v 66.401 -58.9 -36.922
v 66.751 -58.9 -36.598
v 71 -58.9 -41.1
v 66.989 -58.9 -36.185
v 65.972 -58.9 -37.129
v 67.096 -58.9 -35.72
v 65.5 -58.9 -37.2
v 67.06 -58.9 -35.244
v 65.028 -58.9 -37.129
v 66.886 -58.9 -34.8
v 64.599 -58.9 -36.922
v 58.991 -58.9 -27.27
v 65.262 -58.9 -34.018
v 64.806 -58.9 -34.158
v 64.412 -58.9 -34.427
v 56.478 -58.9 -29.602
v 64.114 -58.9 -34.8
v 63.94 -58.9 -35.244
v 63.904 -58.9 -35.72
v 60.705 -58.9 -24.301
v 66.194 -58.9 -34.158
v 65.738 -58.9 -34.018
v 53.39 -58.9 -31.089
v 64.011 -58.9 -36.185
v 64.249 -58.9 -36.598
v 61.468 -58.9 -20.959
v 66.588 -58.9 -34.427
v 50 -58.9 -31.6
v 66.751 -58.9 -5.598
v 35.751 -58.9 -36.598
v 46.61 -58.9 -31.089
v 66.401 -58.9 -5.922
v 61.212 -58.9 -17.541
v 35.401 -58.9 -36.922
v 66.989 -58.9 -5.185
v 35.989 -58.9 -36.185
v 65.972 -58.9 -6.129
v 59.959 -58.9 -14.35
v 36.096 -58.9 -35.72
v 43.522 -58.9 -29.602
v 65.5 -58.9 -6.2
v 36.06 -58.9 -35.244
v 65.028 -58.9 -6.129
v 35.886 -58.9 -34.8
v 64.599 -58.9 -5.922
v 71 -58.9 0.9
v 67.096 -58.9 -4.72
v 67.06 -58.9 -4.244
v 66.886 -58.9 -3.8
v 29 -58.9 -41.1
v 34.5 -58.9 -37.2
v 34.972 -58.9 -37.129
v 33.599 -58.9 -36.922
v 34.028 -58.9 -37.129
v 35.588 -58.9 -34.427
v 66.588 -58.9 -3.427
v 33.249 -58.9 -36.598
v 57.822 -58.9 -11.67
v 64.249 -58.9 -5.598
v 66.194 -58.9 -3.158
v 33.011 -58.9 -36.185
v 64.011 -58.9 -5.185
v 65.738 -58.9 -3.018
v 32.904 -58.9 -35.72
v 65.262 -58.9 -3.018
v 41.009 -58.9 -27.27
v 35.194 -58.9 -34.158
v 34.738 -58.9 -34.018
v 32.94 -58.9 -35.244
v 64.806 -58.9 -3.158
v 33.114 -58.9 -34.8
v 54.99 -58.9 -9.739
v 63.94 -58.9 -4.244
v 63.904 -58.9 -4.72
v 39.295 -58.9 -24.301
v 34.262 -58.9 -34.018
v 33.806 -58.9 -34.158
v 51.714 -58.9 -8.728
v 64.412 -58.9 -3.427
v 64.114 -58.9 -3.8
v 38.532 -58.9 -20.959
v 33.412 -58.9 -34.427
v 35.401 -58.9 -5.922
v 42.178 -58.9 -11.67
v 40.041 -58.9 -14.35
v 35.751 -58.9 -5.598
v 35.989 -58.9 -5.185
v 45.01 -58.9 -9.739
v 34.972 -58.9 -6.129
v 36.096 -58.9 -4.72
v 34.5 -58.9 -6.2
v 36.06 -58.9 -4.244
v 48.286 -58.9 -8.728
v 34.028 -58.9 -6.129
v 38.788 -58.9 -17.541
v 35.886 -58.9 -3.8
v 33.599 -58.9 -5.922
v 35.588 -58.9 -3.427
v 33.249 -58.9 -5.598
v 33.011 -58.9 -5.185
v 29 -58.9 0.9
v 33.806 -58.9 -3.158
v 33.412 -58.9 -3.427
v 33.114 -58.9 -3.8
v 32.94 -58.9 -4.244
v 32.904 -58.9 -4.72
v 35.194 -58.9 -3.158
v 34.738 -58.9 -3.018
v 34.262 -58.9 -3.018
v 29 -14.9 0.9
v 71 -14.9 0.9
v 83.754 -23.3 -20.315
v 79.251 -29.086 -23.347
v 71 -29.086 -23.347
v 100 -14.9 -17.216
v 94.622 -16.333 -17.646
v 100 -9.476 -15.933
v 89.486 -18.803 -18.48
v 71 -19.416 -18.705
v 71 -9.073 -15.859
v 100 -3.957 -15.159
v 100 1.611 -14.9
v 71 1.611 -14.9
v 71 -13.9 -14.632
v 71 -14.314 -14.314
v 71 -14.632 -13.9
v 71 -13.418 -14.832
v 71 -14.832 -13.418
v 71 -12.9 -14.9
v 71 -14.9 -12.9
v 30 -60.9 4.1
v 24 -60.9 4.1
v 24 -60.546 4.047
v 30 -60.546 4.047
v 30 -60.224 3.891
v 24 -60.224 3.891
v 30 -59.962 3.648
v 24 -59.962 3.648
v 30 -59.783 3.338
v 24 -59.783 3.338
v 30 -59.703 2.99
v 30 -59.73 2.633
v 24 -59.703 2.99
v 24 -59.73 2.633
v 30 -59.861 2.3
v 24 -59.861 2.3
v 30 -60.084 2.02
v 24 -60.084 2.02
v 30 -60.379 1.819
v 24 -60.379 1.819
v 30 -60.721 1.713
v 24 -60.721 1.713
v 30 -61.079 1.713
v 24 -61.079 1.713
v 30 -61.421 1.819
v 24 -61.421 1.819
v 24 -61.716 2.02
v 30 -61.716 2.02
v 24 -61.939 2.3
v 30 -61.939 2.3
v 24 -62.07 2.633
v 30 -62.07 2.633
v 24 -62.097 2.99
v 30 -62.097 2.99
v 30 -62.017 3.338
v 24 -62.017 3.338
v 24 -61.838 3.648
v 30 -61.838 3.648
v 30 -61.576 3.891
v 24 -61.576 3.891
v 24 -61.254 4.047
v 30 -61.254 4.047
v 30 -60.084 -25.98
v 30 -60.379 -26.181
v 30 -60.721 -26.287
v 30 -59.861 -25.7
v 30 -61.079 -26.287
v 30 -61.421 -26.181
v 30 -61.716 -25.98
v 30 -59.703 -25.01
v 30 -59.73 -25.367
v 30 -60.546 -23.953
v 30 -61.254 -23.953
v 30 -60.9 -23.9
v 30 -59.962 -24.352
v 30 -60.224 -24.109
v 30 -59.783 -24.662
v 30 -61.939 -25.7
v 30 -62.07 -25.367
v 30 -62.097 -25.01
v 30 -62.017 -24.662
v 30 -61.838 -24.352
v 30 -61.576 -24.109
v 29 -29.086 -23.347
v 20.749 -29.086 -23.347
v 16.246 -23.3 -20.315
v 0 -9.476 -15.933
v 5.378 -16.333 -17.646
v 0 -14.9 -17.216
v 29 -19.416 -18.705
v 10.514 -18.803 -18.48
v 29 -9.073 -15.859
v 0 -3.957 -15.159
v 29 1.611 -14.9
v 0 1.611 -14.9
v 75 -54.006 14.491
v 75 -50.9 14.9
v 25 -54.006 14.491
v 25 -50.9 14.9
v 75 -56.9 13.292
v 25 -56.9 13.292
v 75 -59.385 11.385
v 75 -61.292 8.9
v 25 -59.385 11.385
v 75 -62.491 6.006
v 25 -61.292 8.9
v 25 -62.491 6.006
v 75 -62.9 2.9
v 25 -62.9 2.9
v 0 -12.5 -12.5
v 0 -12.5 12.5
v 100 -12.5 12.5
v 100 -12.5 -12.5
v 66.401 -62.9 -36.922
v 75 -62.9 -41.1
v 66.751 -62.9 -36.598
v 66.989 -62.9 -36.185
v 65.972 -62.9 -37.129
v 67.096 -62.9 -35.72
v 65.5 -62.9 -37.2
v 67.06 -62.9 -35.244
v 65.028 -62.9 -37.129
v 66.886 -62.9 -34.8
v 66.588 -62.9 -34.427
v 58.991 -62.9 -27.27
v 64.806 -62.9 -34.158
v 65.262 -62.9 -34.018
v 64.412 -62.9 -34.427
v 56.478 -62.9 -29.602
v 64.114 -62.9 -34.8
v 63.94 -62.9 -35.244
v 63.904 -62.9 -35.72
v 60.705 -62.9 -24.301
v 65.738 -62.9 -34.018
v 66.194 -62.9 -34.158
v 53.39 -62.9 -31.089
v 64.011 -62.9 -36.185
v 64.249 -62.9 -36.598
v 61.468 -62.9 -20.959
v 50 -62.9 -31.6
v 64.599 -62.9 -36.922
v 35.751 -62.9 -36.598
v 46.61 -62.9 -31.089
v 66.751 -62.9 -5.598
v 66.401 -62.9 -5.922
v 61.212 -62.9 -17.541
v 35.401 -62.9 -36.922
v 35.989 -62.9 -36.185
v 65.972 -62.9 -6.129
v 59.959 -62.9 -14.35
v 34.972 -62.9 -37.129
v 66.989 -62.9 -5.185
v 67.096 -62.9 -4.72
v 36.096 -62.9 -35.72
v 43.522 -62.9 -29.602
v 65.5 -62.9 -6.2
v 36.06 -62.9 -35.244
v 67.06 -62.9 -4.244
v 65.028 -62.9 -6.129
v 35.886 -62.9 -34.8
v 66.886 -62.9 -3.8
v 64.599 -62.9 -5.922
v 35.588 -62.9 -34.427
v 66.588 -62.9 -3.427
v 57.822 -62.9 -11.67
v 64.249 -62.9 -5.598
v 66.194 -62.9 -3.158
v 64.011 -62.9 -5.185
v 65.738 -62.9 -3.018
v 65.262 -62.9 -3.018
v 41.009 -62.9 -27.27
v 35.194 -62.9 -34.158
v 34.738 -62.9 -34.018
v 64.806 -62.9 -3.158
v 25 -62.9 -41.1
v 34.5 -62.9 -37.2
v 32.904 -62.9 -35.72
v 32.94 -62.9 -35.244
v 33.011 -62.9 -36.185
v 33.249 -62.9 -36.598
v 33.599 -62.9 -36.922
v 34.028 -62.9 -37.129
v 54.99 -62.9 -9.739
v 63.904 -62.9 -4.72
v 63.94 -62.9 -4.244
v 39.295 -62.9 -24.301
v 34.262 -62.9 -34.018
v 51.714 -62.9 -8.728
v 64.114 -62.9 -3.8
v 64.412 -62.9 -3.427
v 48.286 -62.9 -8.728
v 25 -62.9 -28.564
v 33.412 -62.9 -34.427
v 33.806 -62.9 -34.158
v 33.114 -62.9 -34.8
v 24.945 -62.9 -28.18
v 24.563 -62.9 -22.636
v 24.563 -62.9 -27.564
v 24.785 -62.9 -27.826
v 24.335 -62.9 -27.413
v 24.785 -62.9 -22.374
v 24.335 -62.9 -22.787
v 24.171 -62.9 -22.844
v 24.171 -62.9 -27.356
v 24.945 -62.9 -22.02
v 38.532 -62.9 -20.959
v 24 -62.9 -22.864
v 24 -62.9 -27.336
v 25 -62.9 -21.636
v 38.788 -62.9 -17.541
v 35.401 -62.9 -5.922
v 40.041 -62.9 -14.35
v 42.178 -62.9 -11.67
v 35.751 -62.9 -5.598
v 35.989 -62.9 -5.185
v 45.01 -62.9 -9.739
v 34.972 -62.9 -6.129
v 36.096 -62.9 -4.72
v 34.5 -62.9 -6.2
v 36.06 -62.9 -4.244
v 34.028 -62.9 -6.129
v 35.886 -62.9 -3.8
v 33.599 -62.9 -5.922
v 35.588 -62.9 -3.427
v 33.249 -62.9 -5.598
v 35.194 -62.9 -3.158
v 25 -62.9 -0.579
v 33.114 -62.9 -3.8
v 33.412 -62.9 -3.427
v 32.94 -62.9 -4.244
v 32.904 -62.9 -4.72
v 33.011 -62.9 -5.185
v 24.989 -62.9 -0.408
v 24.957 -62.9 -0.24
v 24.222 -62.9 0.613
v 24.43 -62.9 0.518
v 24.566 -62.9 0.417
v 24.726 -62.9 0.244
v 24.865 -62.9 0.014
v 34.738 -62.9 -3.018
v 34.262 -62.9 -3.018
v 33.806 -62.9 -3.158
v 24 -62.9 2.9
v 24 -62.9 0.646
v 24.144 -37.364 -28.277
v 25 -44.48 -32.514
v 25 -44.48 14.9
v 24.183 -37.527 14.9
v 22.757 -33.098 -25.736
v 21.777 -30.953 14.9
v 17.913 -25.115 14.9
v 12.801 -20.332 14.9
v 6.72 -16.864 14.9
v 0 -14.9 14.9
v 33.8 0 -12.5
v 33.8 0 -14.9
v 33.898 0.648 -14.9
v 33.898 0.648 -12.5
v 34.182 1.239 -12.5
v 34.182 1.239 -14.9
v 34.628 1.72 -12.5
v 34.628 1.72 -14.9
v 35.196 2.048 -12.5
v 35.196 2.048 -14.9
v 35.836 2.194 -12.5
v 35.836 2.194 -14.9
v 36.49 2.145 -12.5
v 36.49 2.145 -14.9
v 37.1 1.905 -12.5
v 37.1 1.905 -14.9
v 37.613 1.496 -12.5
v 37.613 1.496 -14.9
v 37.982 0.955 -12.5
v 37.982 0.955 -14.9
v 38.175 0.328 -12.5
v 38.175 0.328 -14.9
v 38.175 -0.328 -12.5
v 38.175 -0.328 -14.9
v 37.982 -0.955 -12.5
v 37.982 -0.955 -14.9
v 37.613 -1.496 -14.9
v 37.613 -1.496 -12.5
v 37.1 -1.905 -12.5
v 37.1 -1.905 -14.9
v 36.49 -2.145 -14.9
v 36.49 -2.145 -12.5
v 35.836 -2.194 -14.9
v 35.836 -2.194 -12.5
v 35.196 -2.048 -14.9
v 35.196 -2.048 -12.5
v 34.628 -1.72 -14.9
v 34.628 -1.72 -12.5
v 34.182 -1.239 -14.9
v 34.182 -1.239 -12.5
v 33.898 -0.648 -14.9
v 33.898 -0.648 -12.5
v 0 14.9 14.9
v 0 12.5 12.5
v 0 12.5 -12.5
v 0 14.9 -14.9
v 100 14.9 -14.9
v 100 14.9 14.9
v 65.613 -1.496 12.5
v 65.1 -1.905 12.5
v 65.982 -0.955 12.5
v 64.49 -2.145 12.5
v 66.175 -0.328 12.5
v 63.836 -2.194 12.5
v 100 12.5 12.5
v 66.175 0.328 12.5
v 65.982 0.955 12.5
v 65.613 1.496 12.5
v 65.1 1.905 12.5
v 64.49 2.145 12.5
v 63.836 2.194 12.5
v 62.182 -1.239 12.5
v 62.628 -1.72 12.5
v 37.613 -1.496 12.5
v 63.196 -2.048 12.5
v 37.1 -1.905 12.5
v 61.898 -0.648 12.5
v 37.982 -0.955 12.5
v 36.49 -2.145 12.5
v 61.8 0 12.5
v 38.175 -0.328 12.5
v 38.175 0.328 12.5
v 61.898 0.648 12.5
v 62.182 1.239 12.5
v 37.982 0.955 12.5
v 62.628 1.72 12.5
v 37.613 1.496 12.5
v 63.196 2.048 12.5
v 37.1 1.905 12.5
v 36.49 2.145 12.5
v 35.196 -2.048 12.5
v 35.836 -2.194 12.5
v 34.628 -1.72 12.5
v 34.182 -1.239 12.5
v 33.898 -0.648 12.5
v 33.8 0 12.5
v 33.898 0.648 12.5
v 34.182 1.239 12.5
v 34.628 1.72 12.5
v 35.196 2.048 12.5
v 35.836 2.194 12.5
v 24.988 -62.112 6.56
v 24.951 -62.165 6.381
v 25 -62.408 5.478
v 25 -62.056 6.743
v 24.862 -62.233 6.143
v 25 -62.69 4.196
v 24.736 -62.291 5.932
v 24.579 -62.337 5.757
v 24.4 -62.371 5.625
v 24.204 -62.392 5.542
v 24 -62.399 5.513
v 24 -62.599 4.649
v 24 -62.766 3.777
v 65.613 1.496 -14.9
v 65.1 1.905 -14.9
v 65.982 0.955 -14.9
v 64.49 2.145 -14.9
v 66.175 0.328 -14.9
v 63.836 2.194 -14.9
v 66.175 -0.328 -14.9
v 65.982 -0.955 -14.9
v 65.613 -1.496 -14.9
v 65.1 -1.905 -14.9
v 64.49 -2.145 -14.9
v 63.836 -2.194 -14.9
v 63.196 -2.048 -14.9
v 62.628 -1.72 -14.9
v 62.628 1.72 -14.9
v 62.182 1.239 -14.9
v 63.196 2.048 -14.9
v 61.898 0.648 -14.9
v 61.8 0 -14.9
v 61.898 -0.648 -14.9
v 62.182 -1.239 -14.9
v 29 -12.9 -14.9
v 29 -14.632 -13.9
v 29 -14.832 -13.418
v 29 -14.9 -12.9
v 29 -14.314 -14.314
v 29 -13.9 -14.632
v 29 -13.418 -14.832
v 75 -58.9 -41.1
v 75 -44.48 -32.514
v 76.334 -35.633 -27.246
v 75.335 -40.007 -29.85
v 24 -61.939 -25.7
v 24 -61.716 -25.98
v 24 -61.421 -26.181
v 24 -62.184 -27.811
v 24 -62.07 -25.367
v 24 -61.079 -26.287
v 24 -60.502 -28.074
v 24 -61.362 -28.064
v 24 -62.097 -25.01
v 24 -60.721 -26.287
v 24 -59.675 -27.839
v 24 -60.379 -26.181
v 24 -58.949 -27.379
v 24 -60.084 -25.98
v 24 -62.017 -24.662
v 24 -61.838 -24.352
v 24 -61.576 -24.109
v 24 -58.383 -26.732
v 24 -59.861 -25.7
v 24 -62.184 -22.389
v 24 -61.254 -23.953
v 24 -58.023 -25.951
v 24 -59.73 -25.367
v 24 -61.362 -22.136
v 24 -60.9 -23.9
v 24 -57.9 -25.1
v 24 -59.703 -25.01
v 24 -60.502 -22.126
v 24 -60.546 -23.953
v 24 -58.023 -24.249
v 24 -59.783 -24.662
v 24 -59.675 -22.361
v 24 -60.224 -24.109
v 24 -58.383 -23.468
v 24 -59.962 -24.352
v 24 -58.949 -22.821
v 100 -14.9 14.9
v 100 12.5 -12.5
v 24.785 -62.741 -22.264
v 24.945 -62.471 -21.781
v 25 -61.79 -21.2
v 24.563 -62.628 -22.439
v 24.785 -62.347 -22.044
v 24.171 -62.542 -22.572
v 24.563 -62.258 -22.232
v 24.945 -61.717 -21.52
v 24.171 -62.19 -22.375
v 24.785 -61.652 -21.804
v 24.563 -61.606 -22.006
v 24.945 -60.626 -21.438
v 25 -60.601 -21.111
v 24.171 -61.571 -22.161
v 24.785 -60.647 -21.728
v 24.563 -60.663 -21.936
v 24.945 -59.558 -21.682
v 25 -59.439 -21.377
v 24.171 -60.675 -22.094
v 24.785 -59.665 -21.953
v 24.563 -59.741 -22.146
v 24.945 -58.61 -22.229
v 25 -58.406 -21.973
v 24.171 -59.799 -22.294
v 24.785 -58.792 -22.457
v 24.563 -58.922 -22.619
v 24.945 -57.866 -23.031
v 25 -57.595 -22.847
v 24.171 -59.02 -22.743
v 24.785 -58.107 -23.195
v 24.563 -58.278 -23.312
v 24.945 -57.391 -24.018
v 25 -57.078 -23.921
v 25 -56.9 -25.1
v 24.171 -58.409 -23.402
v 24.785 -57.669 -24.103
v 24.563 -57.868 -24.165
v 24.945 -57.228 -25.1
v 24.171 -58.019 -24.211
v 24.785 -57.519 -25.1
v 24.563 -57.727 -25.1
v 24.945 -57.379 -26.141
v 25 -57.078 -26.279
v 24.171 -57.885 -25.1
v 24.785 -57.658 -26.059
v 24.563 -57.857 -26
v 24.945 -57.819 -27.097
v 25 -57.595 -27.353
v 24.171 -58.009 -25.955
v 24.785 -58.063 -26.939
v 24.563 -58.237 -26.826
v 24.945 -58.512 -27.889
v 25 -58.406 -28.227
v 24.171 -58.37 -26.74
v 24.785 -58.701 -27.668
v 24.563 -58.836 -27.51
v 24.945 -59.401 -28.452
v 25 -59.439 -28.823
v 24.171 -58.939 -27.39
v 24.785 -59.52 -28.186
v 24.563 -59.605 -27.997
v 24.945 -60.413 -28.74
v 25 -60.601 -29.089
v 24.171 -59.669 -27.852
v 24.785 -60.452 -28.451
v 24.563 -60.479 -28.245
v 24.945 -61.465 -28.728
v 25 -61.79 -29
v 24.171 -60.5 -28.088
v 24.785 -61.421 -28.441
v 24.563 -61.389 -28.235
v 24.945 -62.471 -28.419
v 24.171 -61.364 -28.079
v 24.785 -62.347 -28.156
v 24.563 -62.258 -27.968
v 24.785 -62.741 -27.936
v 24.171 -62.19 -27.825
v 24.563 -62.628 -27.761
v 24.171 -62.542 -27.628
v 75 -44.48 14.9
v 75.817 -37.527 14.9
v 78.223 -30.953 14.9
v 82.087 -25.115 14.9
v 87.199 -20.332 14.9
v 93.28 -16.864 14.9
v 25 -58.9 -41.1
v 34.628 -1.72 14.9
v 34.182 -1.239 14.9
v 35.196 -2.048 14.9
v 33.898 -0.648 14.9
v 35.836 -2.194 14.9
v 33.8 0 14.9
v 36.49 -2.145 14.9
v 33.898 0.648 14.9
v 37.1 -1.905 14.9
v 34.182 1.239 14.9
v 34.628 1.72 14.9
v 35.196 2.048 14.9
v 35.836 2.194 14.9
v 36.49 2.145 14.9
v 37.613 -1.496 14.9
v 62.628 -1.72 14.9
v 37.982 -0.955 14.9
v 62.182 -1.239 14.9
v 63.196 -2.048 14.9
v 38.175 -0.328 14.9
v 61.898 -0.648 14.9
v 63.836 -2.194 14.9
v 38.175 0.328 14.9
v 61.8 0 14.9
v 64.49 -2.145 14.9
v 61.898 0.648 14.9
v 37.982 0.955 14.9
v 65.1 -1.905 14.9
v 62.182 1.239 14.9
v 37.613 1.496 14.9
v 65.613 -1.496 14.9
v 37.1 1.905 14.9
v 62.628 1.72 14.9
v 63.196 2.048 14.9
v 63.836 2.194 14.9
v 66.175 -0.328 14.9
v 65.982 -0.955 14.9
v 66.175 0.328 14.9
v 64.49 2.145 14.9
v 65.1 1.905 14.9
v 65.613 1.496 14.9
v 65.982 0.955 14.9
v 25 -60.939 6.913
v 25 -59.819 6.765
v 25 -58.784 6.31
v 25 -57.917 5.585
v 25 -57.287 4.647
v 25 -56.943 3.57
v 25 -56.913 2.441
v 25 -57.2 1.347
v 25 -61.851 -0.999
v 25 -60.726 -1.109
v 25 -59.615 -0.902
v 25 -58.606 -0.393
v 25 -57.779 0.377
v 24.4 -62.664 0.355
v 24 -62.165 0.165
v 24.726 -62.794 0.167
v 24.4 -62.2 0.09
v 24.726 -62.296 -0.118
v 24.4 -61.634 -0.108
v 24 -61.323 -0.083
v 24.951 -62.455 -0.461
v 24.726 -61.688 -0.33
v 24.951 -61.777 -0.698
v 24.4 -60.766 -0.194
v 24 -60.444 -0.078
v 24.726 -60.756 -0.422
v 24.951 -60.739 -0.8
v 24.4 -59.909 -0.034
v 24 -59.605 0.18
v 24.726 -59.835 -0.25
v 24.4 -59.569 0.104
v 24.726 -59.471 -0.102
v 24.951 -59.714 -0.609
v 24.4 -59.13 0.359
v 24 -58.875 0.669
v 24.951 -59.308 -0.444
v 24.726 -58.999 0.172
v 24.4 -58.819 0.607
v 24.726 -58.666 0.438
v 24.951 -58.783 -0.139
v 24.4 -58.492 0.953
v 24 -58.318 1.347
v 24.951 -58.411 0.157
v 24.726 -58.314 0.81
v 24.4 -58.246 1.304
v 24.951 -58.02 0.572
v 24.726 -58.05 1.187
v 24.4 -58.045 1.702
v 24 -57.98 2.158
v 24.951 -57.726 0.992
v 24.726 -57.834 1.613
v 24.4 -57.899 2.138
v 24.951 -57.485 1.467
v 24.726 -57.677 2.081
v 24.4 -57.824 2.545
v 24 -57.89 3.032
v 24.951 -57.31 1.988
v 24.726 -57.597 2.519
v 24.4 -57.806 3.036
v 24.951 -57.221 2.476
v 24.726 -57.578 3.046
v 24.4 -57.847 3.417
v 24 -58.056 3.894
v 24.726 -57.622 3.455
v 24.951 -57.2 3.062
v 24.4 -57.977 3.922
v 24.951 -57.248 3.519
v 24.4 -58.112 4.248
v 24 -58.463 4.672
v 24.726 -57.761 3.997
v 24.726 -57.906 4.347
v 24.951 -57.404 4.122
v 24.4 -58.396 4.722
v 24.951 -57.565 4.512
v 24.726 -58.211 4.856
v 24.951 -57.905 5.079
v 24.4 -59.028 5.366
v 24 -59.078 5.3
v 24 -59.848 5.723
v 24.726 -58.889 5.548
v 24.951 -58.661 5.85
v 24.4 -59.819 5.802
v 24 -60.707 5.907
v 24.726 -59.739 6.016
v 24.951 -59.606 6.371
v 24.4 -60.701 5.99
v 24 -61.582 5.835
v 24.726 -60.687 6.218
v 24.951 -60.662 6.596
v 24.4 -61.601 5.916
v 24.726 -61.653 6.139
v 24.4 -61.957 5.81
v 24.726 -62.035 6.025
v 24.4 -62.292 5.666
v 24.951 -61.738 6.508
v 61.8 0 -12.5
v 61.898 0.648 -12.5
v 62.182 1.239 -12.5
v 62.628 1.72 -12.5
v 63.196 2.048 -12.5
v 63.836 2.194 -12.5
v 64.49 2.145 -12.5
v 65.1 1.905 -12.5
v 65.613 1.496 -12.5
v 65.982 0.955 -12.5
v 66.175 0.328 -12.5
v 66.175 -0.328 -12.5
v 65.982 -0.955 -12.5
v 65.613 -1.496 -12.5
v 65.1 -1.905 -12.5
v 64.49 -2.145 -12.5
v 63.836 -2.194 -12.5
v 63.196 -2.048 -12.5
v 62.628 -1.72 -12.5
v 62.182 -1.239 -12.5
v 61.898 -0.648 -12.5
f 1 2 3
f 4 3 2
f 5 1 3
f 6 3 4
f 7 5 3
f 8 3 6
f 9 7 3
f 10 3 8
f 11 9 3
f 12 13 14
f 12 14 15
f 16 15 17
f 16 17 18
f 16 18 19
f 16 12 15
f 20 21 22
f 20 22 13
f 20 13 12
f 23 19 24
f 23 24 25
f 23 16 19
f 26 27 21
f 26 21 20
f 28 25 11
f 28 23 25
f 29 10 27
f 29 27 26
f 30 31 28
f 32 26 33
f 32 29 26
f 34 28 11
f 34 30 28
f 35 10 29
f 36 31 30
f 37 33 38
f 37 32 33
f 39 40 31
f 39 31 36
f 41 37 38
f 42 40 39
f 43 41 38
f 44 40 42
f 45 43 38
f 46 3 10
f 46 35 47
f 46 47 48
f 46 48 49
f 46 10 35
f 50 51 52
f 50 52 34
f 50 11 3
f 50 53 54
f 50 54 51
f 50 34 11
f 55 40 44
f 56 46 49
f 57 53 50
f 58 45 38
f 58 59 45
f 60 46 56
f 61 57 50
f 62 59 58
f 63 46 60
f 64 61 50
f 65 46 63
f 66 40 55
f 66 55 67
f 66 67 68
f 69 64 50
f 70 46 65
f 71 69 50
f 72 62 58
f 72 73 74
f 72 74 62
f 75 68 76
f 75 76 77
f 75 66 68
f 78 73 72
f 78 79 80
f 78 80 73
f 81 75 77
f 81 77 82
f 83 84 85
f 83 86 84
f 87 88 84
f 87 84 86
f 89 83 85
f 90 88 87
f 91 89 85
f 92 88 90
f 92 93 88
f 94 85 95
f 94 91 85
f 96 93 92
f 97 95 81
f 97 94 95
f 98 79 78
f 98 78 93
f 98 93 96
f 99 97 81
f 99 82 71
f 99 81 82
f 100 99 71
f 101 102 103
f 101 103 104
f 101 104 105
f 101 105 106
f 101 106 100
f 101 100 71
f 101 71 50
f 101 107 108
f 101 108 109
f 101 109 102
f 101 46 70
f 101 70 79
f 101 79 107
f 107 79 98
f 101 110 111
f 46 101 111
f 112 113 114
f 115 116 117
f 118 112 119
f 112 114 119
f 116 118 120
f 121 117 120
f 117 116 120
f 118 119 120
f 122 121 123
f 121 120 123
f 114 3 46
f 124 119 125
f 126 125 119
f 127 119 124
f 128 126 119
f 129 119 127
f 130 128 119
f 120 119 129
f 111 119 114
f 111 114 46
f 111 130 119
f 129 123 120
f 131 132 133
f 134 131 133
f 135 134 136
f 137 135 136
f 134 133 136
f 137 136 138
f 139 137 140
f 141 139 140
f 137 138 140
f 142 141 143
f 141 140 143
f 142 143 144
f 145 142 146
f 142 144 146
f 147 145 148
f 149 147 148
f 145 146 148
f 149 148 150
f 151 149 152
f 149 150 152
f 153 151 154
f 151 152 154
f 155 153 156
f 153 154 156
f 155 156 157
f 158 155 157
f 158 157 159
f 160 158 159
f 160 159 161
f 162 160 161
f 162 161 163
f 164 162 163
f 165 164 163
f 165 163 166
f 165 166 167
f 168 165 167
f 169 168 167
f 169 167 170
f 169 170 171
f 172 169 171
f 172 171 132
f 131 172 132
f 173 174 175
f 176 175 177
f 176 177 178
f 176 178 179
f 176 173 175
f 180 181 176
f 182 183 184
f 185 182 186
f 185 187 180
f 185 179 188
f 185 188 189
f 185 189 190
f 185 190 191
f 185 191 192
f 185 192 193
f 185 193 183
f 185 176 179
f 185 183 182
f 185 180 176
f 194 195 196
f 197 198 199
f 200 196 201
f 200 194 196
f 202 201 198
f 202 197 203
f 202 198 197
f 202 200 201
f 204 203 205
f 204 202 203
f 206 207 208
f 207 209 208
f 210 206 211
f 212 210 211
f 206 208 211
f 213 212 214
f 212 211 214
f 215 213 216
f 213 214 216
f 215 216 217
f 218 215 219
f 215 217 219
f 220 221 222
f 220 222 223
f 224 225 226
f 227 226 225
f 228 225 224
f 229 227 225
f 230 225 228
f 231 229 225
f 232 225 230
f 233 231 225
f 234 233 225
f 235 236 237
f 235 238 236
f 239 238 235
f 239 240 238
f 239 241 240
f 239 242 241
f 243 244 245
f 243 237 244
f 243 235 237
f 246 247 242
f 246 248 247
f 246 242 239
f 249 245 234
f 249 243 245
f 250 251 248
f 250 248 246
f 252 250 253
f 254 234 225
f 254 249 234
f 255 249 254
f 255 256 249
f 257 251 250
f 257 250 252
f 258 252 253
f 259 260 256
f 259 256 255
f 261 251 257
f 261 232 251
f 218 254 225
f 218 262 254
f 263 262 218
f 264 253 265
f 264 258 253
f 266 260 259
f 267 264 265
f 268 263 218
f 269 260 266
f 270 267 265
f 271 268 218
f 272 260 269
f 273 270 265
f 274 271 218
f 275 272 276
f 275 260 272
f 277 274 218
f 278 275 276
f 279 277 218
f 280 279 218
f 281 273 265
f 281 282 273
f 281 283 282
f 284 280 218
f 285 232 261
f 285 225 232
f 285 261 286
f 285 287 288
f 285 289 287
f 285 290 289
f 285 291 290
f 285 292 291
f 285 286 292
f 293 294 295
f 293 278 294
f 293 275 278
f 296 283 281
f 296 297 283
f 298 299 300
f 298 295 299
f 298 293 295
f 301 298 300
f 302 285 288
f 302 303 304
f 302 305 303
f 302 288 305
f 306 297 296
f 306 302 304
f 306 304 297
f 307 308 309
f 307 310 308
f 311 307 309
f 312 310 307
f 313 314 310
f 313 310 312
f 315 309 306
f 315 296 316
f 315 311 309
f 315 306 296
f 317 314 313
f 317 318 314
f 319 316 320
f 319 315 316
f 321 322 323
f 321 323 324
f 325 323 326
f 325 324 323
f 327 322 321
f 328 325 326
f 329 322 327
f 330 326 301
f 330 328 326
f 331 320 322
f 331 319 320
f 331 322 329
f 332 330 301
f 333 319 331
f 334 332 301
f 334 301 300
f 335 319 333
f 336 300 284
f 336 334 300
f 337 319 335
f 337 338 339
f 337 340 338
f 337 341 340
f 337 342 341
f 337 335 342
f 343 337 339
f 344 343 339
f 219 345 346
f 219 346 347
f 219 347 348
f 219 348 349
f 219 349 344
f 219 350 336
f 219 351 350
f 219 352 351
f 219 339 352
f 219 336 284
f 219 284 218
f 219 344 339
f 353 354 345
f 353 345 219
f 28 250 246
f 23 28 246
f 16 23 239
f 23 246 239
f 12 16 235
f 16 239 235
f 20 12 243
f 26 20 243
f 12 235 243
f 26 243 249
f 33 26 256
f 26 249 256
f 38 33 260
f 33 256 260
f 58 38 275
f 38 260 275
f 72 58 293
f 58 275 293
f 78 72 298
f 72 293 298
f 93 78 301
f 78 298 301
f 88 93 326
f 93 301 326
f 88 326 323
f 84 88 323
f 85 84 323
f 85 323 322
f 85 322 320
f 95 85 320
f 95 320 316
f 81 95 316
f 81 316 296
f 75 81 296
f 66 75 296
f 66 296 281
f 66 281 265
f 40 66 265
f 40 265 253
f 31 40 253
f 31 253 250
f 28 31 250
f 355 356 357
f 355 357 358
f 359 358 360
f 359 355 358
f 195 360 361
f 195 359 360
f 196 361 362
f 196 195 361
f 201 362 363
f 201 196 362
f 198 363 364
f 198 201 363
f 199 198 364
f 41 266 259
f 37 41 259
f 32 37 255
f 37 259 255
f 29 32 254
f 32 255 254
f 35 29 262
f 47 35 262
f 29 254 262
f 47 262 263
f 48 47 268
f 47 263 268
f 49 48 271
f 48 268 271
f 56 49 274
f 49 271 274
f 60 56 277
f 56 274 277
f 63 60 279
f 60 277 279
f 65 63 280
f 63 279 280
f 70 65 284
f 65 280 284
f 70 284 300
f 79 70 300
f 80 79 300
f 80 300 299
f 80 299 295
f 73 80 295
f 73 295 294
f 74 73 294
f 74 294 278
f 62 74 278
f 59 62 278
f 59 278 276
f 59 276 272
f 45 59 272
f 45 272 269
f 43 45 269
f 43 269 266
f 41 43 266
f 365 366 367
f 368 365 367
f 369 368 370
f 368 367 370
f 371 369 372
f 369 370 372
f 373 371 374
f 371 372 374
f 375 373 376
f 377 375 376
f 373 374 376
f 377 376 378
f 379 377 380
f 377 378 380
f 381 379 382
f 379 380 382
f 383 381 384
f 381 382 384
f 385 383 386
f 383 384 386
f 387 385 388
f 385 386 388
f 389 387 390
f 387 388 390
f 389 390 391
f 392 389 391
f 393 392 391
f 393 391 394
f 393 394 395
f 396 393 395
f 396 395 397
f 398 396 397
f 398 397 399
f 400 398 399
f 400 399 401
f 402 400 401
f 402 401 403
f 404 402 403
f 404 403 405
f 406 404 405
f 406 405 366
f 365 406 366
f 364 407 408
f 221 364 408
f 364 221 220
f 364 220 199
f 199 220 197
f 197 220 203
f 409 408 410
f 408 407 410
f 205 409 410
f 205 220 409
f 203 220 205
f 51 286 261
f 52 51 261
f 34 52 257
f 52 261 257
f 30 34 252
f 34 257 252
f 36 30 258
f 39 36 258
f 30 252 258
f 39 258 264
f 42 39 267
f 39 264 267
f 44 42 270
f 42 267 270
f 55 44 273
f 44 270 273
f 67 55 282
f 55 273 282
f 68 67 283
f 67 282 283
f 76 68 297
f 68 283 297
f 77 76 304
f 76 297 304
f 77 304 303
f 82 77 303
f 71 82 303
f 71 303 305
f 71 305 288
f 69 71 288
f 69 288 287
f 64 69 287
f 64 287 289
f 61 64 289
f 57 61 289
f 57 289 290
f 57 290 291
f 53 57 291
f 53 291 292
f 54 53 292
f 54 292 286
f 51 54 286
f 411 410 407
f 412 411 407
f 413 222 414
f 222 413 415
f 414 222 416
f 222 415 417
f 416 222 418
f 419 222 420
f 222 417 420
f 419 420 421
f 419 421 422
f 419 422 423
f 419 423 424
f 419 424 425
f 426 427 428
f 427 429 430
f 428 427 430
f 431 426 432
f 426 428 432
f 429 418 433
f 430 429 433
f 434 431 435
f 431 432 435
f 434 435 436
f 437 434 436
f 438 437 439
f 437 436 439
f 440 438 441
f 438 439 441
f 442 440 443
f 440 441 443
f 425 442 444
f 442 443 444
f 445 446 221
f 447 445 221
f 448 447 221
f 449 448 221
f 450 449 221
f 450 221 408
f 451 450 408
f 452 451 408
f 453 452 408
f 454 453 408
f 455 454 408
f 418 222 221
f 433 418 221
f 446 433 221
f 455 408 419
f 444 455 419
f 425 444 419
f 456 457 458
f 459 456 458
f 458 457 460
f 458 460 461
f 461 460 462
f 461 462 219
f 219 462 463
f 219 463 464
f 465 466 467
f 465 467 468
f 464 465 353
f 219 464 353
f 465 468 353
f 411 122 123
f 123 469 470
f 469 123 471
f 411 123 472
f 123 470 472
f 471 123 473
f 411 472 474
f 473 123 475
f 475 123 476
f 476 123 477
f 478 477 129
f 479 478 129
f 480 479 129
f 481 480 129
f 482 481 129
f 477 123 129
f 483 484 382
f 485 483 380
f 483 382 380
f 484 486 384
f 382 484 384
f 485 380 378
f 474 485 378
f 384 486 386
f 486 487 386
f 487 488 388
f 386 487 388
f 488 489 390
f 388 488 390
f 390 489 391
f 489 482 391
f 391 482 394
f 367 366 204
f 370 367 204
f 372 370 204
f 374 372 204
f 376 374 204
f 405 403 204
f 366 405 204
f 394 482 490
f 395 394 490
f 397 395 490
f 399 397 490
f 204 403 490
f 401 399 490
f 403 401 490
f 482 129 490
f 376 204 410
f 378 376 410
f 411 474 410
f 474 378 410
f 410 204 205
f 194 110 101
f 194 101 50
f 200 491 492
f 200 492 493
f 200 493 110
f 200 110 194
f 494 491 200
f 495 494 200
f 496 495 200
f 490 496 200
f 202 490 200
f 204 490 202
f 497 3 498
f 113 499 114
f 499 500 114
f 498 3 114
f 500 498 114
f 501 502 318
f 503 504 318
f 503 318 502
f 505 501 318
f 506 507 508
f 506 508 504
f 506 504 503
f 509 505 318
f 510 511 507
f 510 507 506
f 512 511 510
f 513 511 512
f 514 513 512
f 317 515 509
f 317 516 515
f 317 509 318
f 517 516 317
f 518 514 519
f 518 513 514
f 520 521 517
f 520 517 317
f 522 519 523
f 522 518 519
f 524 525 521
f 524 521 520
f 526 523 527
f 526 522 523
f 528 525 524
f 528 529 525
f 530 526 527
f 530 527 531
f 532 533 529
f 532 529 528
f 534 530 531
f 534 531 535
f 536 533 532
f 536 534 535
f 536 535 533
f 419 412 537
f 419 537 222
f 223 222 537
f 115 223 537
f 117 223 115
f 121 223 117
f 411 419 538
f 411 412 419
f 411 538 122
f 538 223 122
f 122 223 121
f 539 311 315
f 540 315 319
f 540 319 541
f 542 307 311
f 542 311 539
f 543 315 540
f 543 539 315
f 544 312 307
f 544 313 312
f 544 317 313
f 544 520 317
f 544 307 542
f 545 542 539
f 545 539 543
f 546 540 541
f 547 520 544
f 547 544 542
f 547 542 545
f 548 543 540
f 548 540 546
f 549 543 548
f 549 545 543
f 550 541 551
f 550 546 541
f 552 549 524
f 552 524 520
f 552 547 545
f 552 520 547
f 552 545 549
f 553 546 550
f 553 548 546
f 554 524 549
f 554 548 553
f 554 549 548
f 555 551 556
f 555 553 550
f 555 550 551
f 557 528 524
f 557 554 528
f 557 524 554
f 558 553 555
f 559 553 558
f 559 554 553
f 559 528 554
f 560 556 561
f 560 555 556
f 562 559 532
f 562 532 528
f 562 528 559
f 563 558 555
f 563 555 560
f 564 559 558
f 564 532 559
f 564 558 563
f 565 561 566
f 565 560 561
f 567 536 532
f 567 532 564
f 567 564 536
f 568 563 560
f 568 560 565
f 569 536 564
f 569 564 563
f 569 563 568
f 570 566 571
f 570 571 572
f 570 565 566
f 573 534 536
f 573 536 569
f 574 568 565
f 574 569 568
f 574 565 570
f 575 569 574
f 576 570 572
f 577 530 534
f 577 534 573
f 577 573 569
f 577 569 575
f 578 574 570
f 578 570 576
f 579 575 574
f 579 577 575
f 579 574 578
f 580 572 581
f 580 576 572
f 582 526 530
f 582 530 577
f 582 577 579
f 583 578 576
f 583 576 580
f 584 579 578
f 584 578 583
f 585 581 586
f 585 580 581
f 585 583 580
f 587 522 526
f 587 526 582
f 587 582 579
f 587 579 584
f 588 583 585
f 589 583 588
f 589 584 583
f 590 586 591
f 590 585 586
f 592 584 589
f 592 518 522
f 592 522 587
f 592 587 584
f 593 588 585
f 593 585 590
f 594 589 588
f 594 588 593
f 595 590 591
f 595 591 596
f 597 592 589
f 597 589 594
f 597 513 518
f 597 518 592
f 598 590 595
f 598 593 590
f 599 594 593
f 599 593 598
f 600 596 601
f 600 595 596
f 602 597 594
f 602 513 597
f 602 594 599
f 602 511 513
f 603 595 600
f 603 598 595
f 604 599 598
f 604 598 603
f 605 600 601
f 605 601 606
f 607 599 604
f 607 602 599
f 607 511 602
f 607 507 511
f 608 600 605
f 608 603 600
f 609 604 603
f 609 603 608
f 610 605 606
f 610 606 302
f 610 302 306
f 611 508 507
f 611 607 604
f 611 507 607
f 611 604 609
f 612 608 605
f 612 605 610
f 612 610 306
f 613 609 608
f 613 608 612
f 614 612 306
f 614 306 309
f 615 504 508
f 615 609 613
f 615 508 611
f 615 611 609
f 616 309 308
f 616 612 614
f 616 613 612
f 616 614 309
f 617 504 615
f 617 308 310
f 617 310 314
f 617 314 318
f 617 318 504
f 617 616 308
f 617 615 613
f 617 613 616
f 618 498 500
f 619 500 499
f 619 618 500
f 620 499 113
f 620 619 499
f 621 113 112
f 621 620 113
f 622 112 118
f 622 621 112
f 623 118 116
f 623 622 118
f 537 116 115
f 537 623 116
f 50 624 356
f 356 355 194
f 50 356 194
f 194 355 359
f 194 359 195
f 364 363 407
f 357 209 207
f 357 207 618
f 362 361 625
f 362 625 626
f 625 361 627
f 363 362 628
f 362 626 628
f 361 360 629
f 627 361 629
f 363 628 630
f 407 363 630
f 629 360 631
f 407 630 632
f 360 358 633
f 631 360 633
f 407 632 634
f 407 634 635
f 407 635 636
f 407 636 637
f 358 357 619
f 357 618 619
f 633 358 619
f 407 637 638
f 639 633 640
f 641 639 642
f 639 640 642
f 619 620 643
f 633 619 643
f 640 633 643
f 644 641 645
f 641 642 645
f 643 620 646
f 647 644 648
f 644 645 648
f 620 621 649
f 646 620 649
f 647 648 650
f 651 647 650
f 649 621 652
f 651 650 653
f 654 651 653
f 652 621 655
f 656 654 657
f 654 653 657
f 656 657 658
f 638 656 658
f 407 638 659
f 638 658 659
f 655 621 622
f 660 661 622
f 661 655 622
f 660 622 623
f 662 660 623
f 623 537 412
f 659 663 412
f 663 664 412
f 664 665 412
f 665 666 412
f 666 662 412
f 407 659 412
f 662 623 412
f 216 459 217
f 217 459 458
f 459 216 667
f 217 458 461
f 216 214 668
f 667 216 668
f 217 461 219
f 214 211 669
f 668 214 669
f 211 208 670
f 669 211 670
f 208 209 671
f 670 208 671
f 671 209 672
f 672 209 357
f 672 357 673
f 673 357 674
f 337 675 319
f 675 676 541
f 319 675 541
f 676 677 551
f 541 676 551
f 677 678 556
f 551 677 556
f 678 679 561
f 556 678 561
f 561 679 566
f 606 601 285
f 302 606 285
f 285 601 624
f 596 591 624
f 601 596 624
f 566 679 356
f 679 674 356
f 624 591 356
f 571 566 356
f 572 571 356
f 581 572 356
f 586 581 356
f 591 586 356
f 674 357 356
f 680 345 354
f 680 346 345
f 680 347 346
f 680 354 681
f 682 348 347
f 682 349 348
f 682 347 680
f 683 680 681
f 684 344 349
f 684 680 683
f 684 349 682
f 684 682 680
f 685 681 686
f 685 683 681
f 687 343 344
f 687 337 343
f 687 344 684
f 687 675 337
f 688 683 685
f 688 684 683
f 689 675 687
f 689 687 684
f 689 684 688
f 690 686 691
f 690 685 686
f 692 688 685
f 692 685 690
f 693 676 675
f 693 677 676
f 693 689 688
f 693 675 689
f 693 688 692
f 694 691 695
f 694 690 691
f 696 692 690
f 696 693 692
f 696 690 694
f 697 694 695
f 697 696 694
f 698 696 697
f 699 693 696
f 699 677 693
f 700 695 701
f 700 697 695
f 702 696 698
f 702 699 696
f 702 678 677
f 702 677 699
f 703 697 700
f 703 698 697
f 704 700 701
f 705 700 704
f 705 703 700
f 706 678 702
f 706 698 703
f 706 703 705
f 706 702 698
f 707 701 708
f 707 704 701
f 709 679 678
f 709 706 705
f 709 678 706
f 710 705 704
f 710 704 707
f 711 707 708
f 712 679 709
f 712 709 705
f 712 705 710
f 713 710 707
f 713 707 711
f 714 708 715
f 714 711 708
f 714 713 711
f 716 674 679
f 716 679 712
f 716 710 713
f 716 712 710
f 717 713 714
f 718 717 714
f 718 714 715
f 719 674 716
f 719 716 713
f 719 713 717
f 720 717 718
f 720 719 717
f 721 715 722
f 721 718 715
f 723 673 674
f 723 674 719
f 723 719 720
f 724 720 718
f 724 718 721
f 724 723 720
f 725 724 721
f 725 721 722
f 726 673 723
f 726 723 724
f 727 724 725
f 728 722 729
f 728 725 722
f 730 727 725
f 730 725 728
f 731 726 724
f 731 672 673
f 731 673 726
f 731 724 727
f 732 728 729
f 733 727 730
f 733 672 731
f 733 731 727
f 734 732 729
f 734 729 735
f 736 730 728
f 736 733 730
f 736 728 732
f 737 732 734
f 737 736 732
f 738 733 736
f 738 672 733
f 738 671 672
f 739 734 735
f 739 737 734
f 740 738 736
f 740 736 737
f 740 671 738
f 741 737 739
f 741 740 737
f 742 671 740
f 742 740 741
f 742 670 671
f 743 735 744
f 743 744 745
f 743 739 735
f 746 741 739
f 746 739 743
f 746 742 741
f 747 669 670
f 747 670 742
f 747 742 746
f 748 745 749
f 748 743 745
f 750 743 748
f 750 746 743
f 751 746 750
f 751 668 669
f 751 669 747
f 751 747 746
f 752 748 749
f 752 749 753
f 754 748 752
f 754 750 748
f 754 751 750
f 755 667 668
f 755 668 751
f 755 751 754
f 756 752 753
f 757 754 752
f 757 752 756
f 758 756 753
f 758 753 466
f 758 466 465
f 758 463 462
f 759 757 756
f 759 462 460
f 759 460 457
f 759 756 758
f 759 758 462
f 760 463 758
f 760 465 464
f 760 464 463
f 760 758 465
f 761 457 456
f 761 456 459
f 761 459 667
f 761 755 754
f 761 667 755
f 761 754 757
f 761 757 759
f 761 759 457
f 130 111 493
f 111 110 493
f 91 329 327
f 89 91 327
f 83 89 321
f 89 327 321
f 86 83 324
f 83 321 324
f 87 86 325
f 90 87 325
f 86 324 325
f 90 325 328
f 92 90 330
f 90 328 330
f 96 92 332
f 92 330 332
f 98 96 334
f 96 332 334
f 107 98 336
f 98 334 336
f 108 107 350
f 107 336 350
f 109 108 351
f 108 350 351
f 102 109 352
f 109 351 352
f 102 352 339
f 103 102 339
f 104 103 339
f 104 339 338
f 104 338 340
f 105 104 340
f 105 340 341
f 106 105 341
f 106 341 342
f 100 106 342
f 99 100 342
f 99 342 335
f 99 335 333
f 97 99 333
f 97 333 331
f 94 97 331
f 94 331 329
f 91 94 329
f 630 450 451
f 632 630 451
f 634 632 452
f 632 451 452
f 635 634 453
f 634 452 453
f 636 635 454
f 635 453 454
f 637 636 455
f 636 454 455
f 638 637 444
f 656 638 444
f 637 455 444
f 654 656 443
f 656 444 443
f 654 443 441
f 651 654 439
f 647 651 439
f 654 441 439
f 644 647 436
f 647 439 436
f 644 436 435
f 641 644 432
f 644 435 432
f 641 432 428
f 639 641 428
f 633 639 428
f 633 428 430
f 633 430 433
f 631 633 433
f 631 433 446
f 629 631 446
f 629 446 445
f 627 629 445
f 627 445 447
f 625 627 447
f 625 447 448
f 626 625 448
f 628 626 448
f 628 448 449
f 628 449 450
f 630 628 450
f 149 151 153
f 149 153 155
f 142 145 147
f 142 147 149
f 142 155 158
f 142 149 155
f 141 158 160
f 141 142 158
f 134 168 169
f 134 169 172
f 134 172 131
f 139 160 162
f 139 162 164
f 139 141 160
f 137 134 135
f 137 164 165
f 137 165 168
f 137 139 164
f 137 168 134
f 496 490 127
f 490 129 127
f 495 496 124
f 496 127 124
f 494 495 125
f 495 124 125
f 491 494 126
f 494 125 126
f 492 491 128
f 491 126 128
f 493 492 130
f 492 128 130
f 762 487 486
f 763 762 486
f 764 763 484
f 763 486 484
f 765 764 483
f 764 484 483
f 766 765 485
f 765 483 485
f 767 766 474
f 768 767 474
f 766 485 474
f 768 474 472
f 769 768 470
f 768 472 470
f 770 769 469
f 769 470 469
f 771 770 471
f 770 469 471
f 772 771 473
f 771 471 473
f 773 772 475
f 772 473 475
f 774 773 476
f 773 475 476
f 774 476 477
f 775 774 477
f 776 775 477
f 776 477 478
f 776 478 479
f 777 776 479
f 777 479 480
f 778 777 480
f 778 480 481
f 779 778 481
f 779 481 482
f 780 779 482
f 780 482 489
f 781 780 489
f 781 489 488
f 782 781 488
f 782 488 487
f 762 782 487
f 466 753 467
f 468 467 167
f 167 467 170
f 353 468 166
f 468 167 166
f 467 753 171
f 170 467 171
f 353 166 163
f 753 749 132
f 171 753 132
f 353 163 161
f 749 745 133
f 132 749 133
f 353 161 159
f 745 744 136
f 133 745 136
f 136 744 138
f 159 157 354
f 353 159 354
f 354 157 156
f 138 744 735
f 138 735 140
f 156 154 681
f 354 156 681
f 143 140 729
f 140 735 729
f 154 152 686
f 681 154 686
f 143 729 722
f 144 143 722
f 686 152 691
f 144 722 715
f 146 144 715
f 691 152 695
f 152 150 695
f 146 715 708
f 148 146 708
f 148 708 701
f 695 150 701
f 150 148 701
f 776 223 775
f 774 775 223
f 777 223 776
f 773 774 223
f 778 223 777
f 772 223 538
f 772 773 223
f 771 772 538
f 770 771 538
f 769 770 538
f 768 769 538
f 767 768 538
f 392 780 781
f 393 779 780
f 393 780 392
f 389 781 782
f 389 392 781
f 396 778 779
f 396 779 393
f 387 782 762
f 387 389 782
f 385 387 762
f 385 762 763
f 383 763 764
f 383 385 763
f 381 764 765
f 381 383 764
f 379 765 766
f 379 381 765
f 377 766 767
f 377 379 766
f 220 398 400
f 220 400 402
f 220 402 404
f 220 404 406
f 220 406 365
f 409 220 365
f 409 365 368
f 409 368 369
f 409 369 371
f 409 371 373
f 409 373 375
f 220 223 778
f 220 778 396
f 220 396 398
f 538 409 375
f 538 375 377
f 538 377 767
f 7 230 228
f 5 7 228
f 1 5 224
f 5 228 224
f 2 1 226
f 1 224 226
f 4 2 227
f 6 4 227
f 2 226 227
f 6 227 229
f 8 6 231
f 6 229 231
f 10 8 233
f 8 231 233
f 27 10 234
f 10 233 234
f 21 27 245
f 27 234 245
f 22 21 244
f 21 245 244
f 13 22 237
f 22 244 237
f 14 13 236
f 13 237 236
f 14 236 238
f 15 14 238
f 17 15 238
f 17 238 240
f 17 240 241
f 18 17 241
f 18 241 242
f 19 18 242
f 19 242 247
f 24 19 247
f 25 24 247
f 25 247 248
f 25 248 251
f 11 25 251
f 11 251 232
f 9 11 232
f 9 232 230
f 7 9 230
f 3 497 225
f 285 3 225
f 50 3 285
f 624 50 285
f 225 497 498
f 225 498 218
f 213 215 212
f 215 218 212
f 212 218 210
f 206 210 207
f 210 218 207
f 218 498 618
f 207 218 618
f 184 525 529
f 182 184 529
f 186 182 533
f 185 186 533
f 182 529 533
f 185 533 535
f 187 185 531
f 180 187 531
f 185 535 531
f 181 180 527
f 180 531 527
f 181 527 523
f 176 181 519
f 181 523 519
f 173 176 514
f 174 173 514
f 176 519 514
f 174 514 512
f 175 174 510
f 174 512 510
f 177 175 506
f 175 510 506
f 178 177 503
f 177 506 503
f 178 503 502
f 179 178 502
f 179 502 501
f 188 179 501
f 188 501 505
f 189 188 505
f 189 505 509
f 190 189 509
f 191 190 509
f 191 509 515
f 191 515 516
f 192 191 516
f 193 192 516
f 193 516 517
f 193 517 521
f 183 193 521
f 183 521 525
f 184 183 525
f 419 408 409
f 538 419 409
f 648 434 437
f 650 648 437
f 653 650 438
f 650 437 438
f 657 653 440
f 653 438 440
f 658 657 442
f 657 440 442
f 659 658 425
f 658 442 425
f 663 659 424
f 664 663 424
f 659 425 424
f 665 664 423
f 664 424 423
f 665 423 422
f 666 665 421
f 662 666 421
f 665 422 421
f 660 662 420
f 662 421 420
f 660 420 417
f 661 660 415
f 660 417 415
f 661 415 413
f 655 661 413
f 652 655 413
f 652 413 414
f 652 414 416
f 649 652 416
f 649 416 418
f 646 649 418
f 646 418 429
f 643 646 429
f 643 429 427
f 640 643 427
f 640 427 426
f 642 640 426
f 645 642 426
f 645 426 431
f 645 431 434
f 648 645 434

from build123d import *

# Parameters (mm, degrees)
SKETCH_1_W          = 25
SKETCH_1_H          = 25
EXTRUDE_1_DEPTH     = 100
EXTRUDE_1_2_DEPTH   = 48
SKETCH_3_W          = 50.00000000000001
SKETCH_3_H          = 4
EXTRUDE_2_DEPTH     = 42
EXTRUDE_3_DEPTH     = 4
EXTRUDE_4_DEPTH     = 4
FILLET_2_R          = 30
CUT_EXTRUDE_1_REACH = 135.199
SKETCH_6_R          = 11.500000000000005
SKETCH_6_R_2        = 1.6000000000000052
SKETCH_6_R_3        = 1.5999999999999974
SKETCH_6_R_4        = 1.600000000000006
FILLET_3_R          = 12
FILLET_4_R          = 60
SKETCH_7_R          = 2.1999999999999984
CUT_EXTRUDE_2_DEPTH = 122.8378021221657
FILLET_5_R          = 2
SKETCH_8_R          = 1.2000000000000004
SKETCH_8_R_2        = 1.1999999999999995
CUT_EXTRUDE_3_DEPTH = 5
EXTRUDE_START       = 1
SKETCH_9_R          = 1.2000000000000004
SKETCH_9_R_2        = 1.1999999999999986
EXTRUDE_5_DEPTH     = 1
FILLET_6_R          = 1


# Some blends are built 0.0001 mm under size
with BuildPart() as part:
    # Эскиз1 → Extrude 1 (new body)
    with BuildSketch(Plane(origin=(0, 0, 0), x_dir=(0, 0, -1), z_dir=(1, 0, 0))):
        Polygon((14.899999999999997, 14.899999999999999), (-14.900000000000006, 14.899999999999999), (-14.900000000000004, -14.899999999999999), (14.899999999999993, -14.900000000000002), align=None)
        Rectangle(SKETCH_1_W, SKETCH_1_H, mode=Mode.SUBTRACT)
    extrude(amount=EXTRUDE_1_DEPTH)

    # Эскиз2 → Extrude 1 2 (add)
    with BuildSketch(Plane.XZ.offset(14.900000000000002)):
        Polygon((25.000000000000007, 0.9000000000000085), (75.00000000000001, 0.9000000000000085), (75.00000000000001, 14.900000000000016), (25.000000000000007, 14.90000000000001), align=None)
    extrude(amount=EXTRUDE_1_2_DEPTH)

    # Эскиз3 → Бобышка-Вытянуть2 (add)
    with BuildSketch(Plane(origin=(0, 0, 0.9000000000000085), x_dir=(-1, 0, 0), z_dir=(0, 0, -1))):
        with Locations((-50.000000000000014, -60.89999999999999)):
            Rectangle(SKETCH_3_W, SKETCH_3_H)
    extrude(amount=EXTRUDE_2_DEPTH)

    # Эскиз4 → Бобышка-Вытянуть3 (add)
    with BuildSketch(Plane(origin=(75.00000000000001, 0, 0), x_dir=(0, 0, -1), z_dir=(1, 0, 0))):
        Polygon((14.899999999999997, -14.900000000000002), (41.099999999999994, -58.89999999999999), (-0.9000000000000085, -58.89999999999999), (-0.9000000000000032, -14.900000000000002), align=None)
    extrude(amount=-EXTRUDE_3_DEPTH)

    # Эскиз5 → Бобышка-Вытянуть4 (add)
    with BuildSketch(Plane.ZY.offset(-25.000000000000007)):
        Polygon((-41.099999999999994, -58.89999999999999), (-14.899999999999997, -14.900000000000002), (0.9000000000000032, -14.900000000000002), (0.9000000000000085, -58.89999999999999), align=None)
    extrude(amount=-EXTRUDE_4_DEPTH)

    # Скругление2
    # the kernel refuses this fillet: 30 mm, written as the material it adds along each edge
    with BuildSketch(Plane(origin=(75.00000000000001, -14.900000000000002, 14.900000000000016), x_dir=(1, -1.1724e-13, 0), z_dir=(0, 0, -1))) as fillet_2_piece_1_section:
        with BuildLine():
            CenterArc((30.000000000003467, 29.58039891549758), FILLET_2_R, 179.9999999999933, 80.40593177314048)
            Line((3.46799e-12, 29.580398915501096), (-0.5999999999965263, 29.580398915501167))
            Line((-0.5999999999965263, 29.580398915501167), (-0.5999999999999943, 7.034e-14))
            Line((-0.5999999999999943, 7.034e-14), (-7.034e-14, -0.5999999999999996))
            ThreePointArc((-7.034e-14, -0.5999999999999996), (12.50000000000017, -0.6000000000014687), (24.900000000000418, -0.5916079783099508))
            Line((24.900000000000418, -0.5916079783099508), (25.000000000000483, 0))
        make_face()
    fillet_2_piece_1 = extrude(amount=29.80000000000001, mode=Mode.PRIVATE)
    fillet_2_piece_1 = split(fillet_2_piece_1, bisect_by=Plane(origin=(81.1670170800043, -13.413841962792697, -14.0150604414811), z_dir=(0, -0.5116211753096359, 0.8592111341077854)), keep=Keep.TOP, mode=Mode.PRIVATE)
    add(fillet_2_piece_1)
    with BuildSketch(Plane(origin=(75.00000000000001, -14.900000000000002, 14.900000000000016), x_dir=(1, -1.1724e-13, 0), z_dir=(0, 0, -1))) as fillet_2_piece_2_section:
        with BuildLine():
            CenterArc((30.000000000003467, 29.58039891549758), FILLET_2_R, 179.9999999999933, 80.40593177314048)
            Line((3.46799e-12, 29.580398915501096), (-0.5999999999965263, 29.580398915501167))
            Line((-0.5999999999965263, 29.580398915501167), (-0.5999999999999943, 7.034e-14))
            Line((-0.5999999999999943, 7.034e-14), (-7.034e-14, -0.5999999999999996))
            ThreePointArc((-7.034e-14, -0.5999999999999996), (12.50000000000017, -0.6000000000014687), (24.900000000000418, -0.5916079783099508))
            Line((24.900000000000418, -0.5916079783099508), (25.000000000000483, 0))
        make_face()
    fillet_2_piece_2 = extrude(amount=103.75099728875276, mode=Mode.PRIVATE)
    fillet_2_piece_2 = split(fillet_2_piece_2, bisect_by=Plane(origin=(78.03670654551321, -27.69206450172471, -14.899999999999991), z_dir=(0, -1.2e-16, -1)), keep=Keep.TOP, mode=Mode.PRIVATE)
    fillet_2_piece_2 = split(fillet_2_piece_2, bisect_by=Plane(origin=(78.03670654551321, -26.01786323182673, -21.520182197133188), z_dir=(0, -0.5116211753096359, 0.8592111341077854)), keep=Keep.TOP, mode=Mode.PRIVATE)
    add(fillet_2_piece_2)
    with BuildSketch(Plane(origin=(75.00000000000001, -14.900000000000002, 14.900000000000016), x_dir=(1, -1.1724e-13, 0), z_dir=(0, 0, -1))) as fillet_2_piece_3_section:
        with BuildLine():
            CenterArc((30.000000000003467, 29.58039891549758), FILLET_2_R, 179.9999999999933, 80.40593177314048)
            Line((3.46799e-12, 29.580398915501096), (-0.5999999999965263, 29.580398915501167))
            Line((-0.5999999999965263, 29.580398915501167), (-0.5999999999999943, 7.034e-14))
            Line((-0.5999999999999943, 7.034e-14), (-7.034e-14, -0.5999999999999996))
            ThreePointArc((-7.034e-14, -0.5999999999999996), (12.50000000000017, -0.6000000000014687), (24.900000000000418, -0.5916079783099508))
            Line((24.900000000000418, -0.5916079783099508), (25.000000000000483, 0))
        make_face()
    fillet_2_piece_3 = extrude(amount=29.80000000000001, mode=Mode.PRIVATE)
    fillet_2_piece_3 = split(fillet_2_piece_3, bisect_by=Plane(origin=(87.30790234875249, -14.553945511924846, -14.6939402821007), z_dir=(0, 0.5116211753096359, -0.8592111341077854)), keep=Keep.TOP, mode=Mode.PRIVATE)
    add(fillet_2_piece_3)
    with BuildSketch(Plane(origin=(25.000000000000007, -14.900000000000011, -88.85099728875262), x_dir=(0, -1, 0), z_dir=(0, 0, 1))) as fillet_2_piece_4_section:
        with BuildLine():
            CenterArc((29.5803989155011, -30), FILLET_2_R, 90, 80.40593177314054)
            Line((2.93632e-12, -25.000000000000504), (-0.5916079783070263, -24.900000000000514))
            ThreePointArc((-0.5916079783070263, -24.900000000000514), (-0.5999999999999996, -12.500000000000252), (-0.5999999999999996, 0))
            Line((-0.5999999999999996, 0), (0, 0.6000000000000014))
            Line((0, 0.6000000000000014), (29.5803989155011, 0.6000000000000014))
            Line((29.5803989155011, 0.6000000000000014), (29.5803989155011, 0))
        make_face()
    fillet_2_piece_4 = extrude(amount=103.75099728875263, mode=Mode.PRIVATE)
    fillet_2_piece_4 = split(fillet_2_piece_4, bisect_by=Plane(origin=(21.96329345452578, -26.01786323182675, -21.5201821971332), z_dir=(0, -0.5116211753096359, 0.8592111341077854)), keep=Keep.TOP, mode=Mode.PRIVATE)
    fillet_2_piece_4 = split(fillet_2_piece_4, bisect_by=Plane(origin=(21.96329345452578, -27.69206450173281, -14.899999999999991), z_dir=(0, -1.2e-16, -1)), keep=Keep.TOP, mode=Mode.PRIVATE)
    add(fillet_2_piece_4)
    with BuildSketch(Plane(origin=(25.000000000000007, -14.900000000000002, -14.899999999999997), x_dir=(0, -1, 0), z_dir=(0, 0, 1))) as fillet_2_piece_5_section:
        with BuildLine():
            CenterArc((29.58039891550111, -30), FILLET_2_R, 90, 80.40593177314054)
            Line((2.9452e-12, -25.000000000000504), (-0.5916079783070174, -24.900000000000514))
            ThreePointArc((-0.5916079783070174, -24.900000000000514), (-0.5999999999999996, -12.500000000000252), (-0.5999999999999996, 0))
            Line((-0.5999999999999996, 0), (0, 0.6000000000000014))
            Line((0, 0.6000000000000014), (29.58039891550111, 0.6000000000000014))
            Line((29.58039891550111, 0.6000000000000014), (29.58039891550111, 0))
        make_face()
    fillet_2_piece_5 = extrude(amount=29.800000000000004, mode=Mode.PRIVATE)
    fillet_2_piece_5 = split(fillet_2_piece_5, bisect_by=Plane(origin=(12.6920976512564, -14.55394551192456, -14.693940282100531), z_dir=(0, 0.5116211753096359, -0.8592111341077854)), keep=Keep.TOP, mode=Mode.PRIVATE)
    add(fillet_2_piece_5)
    with BuildSketch(Plane(origin=(25.000000000000007, -14.900000000000002, -14.899999999999997), x_dir=(0, -1, 0), z_dir=(0, 0, 1))) as fillet_2_piece_6_section:
        with BuildLine():
            CenterArc((29.58039891550111, -30), FILLET_2_R, 90, 80.40593177314054)
            Line((2.9452e-12, -25.000000000000504), (-0.5916079783070174, -24.900000000000514))
            ThreePointArc((-0.5916079783070174, -24.900000000000514), (-0.5999999999999996, -12.500000000000252), (-0.5999999999999996, 0))
            Line((-0.5999999999999996, 0), (0, 0.6000000000000014))
            Line((0, 0.6000000000000014), (29.58039891550111, 0.6000000000000014))
            Line((29.58039891550111, 0.6000000000000014), (29.58039891550111, 0))
        make_face()
    fillet_2_piece_6 = extrude(amount=29.800000000000004, mode=Mode.PRIVATE)
    fillet_2_piece_6 = split(fillet_2_piece_6, bisect_by=Plane(origin=(18.83298291999507, -13.413841962792766, -14.015060441481143), z_dir=(0, -0.5116211753096359, 0.8592111341077854)), keep=Keep.TOP, mode=Mode.PRIVATE)
    add(fillet_2_piece_6)

    # Эскиз6 → Вырез-Вытянуть1 (cut, up to next)
    with BuildSketch(Plane.XZ.offset(62.9), mode=Mode.PRIVATE) as cut_extrude_1_sk1:
        with Locations(Location((50.00000000000001, -20.099999999999998, 0), (0, 0, 270))):
            Circle(SKETCH_6_R)
    cut_extrude_1_tool1 = extrude(cut_extrude_1_sk1.sketch, amount=-CUT_EXTRUDE_1_REACH, mode=Mode.PRIVATE) & part.part
    # Эскиз6 → Вырез-Вытянуть1 (cut, up to next)
    with BuildSketch(Plane.XZ.offset(62.9), mode=Mode.PRIVATE) as cut_extrude_1_sk2:
        with Locations(Location((34.50000000000001, -4.599999999999993, 0), (0, 0, 270))):
            Circle(SKETCH_6_R_2)
    cut_extrude_1_tool2 = extrude(cut_extrude_1_sk2.sketch, amount=-CUT_EXTRUDE_1_REACH, mode=Mode.PRIVATE) & part.part
    # Эскиз6 → Вырез-Вытянуть1 (cut, up to next)
    with BuildSketch(Plane.XZ.offset(62.9), mode=Mode.PRIVATE) as cut_extrude_1_sk3:
        with Locations(Location((65.5, -4.599999999999993, 0), (0, 0, 270))):
            Circle(SKETCH_6_R_2)
    cut_extrude_1_tool3 = extrude(cut_extrude_1_sk3.sketch, amount=-CUT_EXTRUDE_1_REACH, mode=Mode.PRIVATE) & part.part
    # Эскиз6 → Вырез-Вытянуть1 (cut, up to next)
    with BuildSketch(Plane.XZ.offset(62.9), mode=Mode.PRIVATE) as cut_extrude_1_sk4:
        with Locations(Location((34.50000000000001, -35.599999999999994, 0), (0, 0, 270))):
            Circle(SKETCH_6_R_3)
    cut_extrude_1_tool4 = extrude(cut_extrude_1_sk4.sketch, amount=-CUT_EXTRUDE_1_REACH, mode=Mode.PRIVATE) & part.part
    # Эскиз6 → Вырез-Вытянуть1 (cut, up to next)
    with BuildSketch(Plane.XZ.offset(62.9), mode=Mode.PRIVATE) as cut_extrude_1_sk5:
        with Locations(Location((65.5, -35.599999999999994, 0), (0, 0, 270))):
            Circle(SKETCH_6_R_4)
    cut_extrude_1_tool5 = extrude(cut_extrude_1_sk5.sketch, amount=-CUT_EXTRUDE_1_REACH, mode=Mode.PRIVATE) & part.part
    add(cut_extrude_1_tool1.solids().sort_by_distance((50, -62.9, -20.1))[0], mode=Mode.SUBTRACT)
    add(cut_extrude_1_tool2.solids().sort_by_distance((34.5, -62.9, -4.6))[0], mode=Mode.SUBTRACT)
    add(cut_extrude_1_tool3.solids().sort_by_distance((65.5, -62.9, -4.6))[0], mode=Mode.SUBTRACT)
    add(cut_extrude_1_tool4.solids().sort_by_distance((34.5, -62.9, -35.6))[0], mode=Mode.SUBTRACT)
    add(cut_extrude_1_tool5.solids().sort_by_distance((65.5, -62.9, -35.6))[0], mode=Mode.SUBTRACT)

    # Скругление3
    fillet_3_edges = [part.edges().sort_by_distance(p)[0] for p in [
        (50.000000000000014, -62.900000000000006, 14.900000000000013),
    ]]
    fillet(fillet_3_edges, radius=FILLET_3_R)

    # Скругление4
    fillet_4_edges = [part.edges().sort_by_distance(p)[0] for p in [
        (14.499999999999712, -14.900000000000967, -14.899999999999435),
        (85.49999999999991, -14.900000000000125, -14.899999999999999),
    ]]
    fillet(fillet_4_edges, radius=FILLET_4_R)

    # Эскиз7 → Вырез-Вытянуть2 (cut, through all)
    with BuildSketch(Plane(origin=(0, 0, -14.899999999999997), x_dir=(-1, 0, 0), z_dir=(0, 0, -1))):
        with Locations((-64, -7.84e-15)):
            Circle(SKETCH_7_R)
        with Locations((-36, -4.41e-15)):
            Circle(SKETCH_7_R)
    extrude(amount=-CUT_EXTRUDE_2_DEPTH, mode=Mode.SUBTRACT)

    # Скругление5
    fillet_5_edges = [part.edges().sort_by_distance(p)[0] for p in [
        (50.000000000000014, -14.900000000000002, -14.899999999999993),
    ]]
    fillet(fillet_5_edges, radius=FILLET_5_R)

    # Эскиз8 → Вырез-Вытянуть3 (cut)
    with BuildSketch(Plane.ZY.offset(-25.000000000000007)):
        with Locations((-25.099999999999998, -60.9)):
            Circle(SKETCH_8_R)
        with Locations((2.9000000000000035, -60.9)):
            Circle(SKETCH_8_R_2)
    extrude(amount=-CUT_EXTRUDE_3_DEPTH, mode=Mode.SUBTRACT)

    # Эскиз9 → Бобышка-Вытянуть5 (add)
    # profile 1 of 2: a face of its own
    with BuildSketch(Plane.ZY.offset(-25.000000000000007).offset(EXTRUDE_START)):
        with BuildLine():
            Line((-27.336067977499788, -62.9), (-22.863932022500208, -62.9))
            ThreePointArc((-22.863932022500208, -62.9), (-25.099999999999998, -57.9), (-27.336067977499788, -62.9))
        make_face()
        with Locations((-25.099999999999998, -60.9)):
            Circle(SKETCH_9_R, mode=Mode.SUBTRACT)
    # profile 2 of 2: a face of its own
    with BuildSketch(Plane.ZY.offset(-25.000000000000007).offset(EXTRUDE_START)):
        with BuildLine():
            Line((2.9000000000000035, -62.9), (0.6463835715880533, -62.9))
            ThreePointArc((0.6463835715880533, -62.9), (2.5917609374486457, -57.90270527196178), (5.513498770016945, -62.39947030164927))
            ThreePointArc((5.513498770016945, -62.39947030164927), (4.213782424449112, -62.686457926692185), (2.9000000000000035, -62.9))
        make_face()
        with Locations((2.9000000000000035, -60.9)):
            Circle(SKETCH_9_R_2, mode=Mode.SUBTRACT)
    extrude(amount=-EXTRUDE_5_DEPTH)

    # Скругление6
    fillet_6_edges = [part.edges().sort_by_distance(p)[0] for p in [
        (25.000000000000007, -57.90270527196177, 2.59176093744865),
        (25.000000000000007, -57.9, -25.099999999999998),
    ]]
    fillet(fillet_6_edges, radius=FILLET_6_R - 0.0001)  # a hair under: the kernel refuses the full size


solid = part.part
